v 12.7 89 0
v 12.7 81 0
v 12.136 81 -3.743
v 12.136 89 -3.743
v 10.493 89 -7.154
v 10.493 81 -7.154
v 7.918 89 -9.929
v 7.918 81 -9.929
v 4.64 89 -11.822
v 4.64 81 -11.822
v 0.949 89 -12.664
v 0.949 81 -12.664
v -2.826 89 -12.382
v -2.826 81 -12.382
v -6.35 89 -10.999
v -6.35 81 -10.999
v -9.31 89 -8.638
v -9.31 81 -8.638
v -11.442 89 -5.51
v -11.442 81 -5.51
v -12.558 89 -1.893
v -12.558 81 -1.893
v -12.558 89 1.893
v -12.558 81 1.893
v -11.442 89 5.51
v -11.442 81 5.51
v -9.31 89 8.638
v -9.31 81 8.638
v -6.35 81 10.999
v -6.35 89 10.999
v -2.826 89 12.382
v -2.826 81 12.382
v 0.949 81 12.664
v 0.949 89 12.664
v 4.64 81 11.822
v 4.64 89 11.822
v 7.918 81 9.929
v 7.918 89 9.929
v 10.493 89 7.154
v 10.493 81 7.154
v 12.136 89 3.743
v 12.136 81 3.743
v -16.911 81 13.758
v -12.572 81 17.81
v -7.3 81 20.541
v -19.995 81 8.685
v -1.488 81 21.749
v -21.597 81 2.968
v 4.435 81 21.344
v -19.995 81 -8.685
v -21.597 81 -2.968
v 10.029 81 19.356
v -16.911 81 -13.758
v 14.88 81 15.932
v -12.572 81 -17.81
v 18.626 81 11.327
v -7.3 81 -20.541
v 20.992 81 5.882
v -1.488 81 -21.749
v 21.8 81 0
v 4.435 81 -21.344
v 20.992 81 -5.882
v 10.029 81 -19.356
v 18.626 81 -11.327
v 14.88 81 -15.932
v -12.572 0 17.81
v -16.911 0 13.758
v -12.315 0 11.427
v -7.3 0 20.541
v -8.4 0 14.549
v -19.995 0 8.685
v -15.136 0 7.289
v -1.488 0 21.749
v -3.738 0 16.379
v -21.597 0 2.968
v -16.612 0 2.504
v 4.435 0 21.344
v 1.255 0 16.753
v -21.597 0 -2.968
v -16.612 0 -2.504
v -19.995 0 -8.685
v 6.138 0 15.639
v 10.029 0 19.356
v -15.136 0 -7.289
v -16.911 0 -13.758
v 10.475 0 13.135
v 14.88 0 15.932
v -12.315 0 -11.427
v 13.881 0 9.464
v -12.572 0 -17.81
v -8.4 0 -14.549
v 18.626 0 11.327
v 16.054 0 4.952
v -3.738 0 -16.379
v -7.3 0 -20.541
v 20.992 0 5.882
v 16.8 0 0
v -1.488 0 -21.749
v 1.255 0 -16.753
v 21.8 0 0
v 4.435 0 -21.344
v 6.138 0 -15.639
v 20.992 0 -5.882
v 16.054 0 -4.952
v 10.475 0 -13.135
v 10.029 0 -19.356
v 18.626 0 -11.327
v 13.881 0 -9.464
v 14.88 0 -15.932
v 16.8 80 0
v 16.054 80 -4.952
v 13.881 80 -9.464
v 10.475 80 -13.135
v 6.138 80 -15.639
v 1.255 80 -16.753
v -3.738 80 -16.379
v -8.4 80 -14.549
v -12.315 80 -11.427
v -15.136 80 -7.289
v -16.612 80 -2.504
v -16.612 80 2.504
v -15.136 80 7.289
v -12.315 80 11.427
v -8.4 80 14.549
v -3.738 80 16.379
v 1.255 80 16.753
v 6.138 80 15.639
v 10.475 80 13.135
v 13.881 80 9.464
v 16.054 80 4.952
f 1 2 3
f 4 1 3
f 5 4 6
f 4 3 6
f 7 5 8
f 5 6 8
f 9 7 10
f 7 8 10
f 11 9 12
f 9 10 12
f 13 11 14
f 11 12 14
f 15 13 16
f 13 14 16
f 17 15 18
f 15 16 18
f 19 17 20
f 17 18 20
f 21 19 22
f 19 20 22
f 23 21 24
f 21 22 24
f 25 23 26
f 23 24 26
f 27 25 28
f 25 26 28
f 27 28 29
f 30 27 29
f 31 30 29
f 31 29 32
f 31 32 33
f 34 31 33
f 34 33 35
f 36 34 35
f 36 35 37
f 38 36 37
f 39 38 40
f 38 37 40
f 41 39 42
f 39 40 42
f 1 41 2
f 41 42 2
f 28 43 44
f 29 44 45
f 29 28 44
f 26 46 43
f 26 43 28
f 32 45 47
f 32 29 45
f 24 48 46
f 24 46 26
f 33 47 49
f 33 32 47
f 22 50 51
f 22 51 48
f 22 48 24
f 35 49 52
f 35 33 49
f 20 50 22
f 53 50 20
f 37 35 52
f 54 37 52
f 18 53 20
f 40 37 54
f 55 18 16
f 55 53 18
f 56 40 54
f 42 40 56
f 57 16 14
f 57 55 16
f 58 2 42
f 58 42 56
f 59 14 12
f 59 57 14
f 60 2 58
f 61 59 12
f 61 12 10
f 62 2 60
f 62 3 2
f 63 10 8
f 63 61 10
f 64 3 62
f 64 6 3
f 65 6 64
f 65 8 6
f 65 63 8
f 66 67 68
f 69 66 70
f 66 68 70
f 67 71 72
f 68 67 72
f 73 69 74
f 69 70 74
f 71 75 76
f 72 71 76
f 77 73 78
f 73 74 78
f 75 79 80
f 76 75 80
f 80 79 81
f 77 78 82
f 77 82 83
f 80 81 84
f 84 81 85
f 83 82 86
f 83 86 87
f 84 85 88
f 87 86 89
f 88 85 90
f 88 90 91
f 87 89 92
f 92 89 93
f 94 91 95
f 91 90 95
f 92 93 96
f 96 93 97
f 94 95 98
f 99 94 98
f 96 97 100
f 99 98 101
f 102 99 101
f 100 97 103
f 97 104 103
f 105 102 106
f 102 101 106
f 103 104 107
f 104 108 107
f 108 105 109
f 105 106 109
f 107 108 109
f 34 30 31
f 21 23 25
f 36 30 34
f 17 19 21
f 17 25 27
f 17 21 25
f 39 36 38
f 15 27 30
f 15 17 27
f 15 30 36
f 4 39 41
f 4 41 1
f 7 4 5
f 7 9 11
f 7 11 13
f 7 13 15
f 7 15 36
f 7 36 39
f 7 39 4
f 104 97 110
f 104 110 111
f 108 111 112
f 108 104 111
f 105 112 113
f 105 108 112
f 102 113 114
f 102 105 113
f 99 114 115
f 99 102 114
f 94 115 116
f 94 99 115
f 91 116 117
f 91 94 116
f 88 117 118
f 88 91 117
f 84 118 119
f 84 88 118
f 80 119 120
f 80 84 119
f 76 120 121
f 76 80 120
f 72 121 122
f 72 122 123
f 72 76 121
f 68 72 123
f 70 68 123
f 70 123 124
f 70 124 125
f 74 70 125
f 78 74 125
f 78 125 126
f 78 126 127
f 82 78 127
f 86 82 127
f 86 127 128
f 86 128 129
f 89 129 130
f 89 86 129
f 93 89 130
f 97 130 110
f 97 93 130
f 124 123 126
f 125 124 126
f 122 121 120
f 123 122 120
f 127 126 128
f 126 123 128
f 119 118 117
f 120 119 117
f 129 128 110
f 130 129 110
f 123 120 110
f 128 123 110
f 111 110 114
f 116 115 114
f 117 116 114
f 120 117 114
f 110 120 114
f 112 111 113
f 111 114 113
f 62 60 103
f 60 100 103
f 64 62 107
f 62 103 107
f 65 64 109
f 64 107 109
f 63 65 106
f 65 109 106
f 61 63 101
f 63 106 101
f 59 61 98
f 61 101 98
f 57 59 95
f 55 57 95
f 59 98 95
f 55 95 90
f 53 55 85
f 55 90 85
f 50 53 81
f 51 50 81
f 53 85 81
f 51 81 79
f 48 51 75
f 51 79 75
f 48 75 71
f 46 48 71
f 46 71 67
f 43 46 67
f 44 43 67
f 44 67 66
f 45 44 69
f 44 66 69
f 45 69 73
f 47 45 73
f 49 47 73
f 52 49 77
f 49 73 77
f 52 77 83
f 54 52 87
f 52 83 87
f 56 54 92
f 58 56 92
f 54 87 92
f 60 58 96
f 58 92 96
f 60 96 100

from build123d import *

# Parameters (mm, degrees)
SKETCH1_R           = 21.8
SKETCH1_R_2         = 16.8
BOSS_EXTRUDE1_DEPTH = 80
SKETCH3_R           = 21.8
BOSS_EXTRUDE2_DEPTH = 1
SKETCH4_R           = 12.7
BOSS_EXTRUDE3_DEPTH = 8


with BuildPart() as part:
    # Sketch1 → Boss-Extrude1 (new body)
    with BuildSketch(Plane(origin=(0, 0, 0), x_dir=(1, 0, 0), z_dir=(0, 1, 0))):
        Circle(SKETCH1_R)
        Circle(SKETCH1_R_2, mode=Mode.SUBTRACT)
    extrude(amount=BOSS_EXTRUDE1_DEPTH)

    # Sketch3 → Boss-Extrude2 (add)
    with BuildSketch(Plane(origin=(0, 80, 0), x_dir=(1, 0, 0), z_dir=(0, 1, 0))):
        Circle(SKETCH3_R)
    extrude(amount=BOSS_EXTRUDE2_DEPTH)

    # Sketch4 → Boss-Extrude3 (add)
    with BuildSketch(Plane(origin=(0, 81, 0), x_dir=(1, 0, 0), z_dir=(0, 1, 0))):
        Circle(SKETCH4_R)
    extrude(amount=BOSS_EXTRUDE3_DEPTH)


solid = part.part
